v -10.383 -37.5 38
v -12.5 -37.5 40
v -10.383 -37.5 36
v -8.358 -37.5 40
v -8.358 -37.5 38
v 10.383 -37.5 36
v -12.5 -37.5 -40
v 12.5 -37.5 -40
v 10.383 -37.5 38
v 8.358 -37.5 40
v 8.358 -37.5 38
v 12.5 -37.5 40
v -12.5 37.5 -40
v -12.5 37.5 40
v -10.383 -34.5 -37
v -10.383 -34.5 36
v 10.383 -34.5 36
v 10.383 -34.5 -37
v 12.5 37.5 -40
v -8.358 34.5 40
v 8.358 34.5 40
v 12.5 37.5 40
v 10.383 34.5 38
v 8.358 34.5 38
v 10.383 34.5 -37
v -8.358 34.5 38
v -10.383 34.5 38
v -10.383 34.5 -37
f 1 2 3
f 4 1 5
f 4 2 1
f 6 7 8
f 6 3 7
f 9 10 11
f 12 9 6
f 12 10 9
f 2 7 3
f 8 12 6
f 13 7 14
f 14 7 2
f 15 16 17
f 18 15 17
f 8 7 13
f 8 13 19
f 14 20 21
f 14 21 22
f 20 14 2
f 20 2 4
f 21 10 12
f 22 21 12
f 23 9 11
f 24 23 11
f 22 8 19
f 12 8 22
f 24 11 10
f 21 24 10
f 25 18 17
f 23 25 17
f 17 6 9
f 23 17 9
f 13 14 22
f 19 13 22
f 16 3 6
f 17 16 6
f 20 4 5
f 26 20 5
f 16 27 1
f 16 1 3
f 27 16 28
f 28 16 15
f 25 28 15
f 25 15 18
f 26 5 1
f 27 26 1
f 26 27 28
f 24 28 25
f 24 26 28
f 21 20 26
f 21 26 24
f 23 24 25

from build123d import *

# Parameters (mm, degrees)
F0_W     = 25
F0_H     = 80
F1_DEPTH = 37.5
F3_DEPTH = 72
F4_W     = 20.765108
F4_H     = 69
F5_DEPTH = 73


with BuildPart() as f1:
    # F0 (on Front) → F1 (new body, symmetric)
    with BuildSketch(Plane.XZ):
        Rectangle(F0_W, F0_H)
    extrude(amount=F1_DEPTH, both=True)

    # F2 (on face) → F3 (cut)
    with BuildSketch(Plane.XZ.offset(37.5)):
        Polygon((8.357823, 38), (8.357823, 40), (0, 40), (-8.357823, 40), (-8.357823, 38), (-10.382554, 38), (-10.382554, 36), (0, 36), (10.382554, 36), (10.382554, 38), align=None)
    extrude(amount=-F3_DEPTH, mode=Mode.SUBTRACT)

    # F4 (on face) → F5 (cut)
    with BuildSketch(Plane.XY.offset(36)):
        Rectangle(F4_W, F4_H)
    extrude(amount=-F5_DEPTH, mode=Mode.SUBTRACT)


solid = f1.part
